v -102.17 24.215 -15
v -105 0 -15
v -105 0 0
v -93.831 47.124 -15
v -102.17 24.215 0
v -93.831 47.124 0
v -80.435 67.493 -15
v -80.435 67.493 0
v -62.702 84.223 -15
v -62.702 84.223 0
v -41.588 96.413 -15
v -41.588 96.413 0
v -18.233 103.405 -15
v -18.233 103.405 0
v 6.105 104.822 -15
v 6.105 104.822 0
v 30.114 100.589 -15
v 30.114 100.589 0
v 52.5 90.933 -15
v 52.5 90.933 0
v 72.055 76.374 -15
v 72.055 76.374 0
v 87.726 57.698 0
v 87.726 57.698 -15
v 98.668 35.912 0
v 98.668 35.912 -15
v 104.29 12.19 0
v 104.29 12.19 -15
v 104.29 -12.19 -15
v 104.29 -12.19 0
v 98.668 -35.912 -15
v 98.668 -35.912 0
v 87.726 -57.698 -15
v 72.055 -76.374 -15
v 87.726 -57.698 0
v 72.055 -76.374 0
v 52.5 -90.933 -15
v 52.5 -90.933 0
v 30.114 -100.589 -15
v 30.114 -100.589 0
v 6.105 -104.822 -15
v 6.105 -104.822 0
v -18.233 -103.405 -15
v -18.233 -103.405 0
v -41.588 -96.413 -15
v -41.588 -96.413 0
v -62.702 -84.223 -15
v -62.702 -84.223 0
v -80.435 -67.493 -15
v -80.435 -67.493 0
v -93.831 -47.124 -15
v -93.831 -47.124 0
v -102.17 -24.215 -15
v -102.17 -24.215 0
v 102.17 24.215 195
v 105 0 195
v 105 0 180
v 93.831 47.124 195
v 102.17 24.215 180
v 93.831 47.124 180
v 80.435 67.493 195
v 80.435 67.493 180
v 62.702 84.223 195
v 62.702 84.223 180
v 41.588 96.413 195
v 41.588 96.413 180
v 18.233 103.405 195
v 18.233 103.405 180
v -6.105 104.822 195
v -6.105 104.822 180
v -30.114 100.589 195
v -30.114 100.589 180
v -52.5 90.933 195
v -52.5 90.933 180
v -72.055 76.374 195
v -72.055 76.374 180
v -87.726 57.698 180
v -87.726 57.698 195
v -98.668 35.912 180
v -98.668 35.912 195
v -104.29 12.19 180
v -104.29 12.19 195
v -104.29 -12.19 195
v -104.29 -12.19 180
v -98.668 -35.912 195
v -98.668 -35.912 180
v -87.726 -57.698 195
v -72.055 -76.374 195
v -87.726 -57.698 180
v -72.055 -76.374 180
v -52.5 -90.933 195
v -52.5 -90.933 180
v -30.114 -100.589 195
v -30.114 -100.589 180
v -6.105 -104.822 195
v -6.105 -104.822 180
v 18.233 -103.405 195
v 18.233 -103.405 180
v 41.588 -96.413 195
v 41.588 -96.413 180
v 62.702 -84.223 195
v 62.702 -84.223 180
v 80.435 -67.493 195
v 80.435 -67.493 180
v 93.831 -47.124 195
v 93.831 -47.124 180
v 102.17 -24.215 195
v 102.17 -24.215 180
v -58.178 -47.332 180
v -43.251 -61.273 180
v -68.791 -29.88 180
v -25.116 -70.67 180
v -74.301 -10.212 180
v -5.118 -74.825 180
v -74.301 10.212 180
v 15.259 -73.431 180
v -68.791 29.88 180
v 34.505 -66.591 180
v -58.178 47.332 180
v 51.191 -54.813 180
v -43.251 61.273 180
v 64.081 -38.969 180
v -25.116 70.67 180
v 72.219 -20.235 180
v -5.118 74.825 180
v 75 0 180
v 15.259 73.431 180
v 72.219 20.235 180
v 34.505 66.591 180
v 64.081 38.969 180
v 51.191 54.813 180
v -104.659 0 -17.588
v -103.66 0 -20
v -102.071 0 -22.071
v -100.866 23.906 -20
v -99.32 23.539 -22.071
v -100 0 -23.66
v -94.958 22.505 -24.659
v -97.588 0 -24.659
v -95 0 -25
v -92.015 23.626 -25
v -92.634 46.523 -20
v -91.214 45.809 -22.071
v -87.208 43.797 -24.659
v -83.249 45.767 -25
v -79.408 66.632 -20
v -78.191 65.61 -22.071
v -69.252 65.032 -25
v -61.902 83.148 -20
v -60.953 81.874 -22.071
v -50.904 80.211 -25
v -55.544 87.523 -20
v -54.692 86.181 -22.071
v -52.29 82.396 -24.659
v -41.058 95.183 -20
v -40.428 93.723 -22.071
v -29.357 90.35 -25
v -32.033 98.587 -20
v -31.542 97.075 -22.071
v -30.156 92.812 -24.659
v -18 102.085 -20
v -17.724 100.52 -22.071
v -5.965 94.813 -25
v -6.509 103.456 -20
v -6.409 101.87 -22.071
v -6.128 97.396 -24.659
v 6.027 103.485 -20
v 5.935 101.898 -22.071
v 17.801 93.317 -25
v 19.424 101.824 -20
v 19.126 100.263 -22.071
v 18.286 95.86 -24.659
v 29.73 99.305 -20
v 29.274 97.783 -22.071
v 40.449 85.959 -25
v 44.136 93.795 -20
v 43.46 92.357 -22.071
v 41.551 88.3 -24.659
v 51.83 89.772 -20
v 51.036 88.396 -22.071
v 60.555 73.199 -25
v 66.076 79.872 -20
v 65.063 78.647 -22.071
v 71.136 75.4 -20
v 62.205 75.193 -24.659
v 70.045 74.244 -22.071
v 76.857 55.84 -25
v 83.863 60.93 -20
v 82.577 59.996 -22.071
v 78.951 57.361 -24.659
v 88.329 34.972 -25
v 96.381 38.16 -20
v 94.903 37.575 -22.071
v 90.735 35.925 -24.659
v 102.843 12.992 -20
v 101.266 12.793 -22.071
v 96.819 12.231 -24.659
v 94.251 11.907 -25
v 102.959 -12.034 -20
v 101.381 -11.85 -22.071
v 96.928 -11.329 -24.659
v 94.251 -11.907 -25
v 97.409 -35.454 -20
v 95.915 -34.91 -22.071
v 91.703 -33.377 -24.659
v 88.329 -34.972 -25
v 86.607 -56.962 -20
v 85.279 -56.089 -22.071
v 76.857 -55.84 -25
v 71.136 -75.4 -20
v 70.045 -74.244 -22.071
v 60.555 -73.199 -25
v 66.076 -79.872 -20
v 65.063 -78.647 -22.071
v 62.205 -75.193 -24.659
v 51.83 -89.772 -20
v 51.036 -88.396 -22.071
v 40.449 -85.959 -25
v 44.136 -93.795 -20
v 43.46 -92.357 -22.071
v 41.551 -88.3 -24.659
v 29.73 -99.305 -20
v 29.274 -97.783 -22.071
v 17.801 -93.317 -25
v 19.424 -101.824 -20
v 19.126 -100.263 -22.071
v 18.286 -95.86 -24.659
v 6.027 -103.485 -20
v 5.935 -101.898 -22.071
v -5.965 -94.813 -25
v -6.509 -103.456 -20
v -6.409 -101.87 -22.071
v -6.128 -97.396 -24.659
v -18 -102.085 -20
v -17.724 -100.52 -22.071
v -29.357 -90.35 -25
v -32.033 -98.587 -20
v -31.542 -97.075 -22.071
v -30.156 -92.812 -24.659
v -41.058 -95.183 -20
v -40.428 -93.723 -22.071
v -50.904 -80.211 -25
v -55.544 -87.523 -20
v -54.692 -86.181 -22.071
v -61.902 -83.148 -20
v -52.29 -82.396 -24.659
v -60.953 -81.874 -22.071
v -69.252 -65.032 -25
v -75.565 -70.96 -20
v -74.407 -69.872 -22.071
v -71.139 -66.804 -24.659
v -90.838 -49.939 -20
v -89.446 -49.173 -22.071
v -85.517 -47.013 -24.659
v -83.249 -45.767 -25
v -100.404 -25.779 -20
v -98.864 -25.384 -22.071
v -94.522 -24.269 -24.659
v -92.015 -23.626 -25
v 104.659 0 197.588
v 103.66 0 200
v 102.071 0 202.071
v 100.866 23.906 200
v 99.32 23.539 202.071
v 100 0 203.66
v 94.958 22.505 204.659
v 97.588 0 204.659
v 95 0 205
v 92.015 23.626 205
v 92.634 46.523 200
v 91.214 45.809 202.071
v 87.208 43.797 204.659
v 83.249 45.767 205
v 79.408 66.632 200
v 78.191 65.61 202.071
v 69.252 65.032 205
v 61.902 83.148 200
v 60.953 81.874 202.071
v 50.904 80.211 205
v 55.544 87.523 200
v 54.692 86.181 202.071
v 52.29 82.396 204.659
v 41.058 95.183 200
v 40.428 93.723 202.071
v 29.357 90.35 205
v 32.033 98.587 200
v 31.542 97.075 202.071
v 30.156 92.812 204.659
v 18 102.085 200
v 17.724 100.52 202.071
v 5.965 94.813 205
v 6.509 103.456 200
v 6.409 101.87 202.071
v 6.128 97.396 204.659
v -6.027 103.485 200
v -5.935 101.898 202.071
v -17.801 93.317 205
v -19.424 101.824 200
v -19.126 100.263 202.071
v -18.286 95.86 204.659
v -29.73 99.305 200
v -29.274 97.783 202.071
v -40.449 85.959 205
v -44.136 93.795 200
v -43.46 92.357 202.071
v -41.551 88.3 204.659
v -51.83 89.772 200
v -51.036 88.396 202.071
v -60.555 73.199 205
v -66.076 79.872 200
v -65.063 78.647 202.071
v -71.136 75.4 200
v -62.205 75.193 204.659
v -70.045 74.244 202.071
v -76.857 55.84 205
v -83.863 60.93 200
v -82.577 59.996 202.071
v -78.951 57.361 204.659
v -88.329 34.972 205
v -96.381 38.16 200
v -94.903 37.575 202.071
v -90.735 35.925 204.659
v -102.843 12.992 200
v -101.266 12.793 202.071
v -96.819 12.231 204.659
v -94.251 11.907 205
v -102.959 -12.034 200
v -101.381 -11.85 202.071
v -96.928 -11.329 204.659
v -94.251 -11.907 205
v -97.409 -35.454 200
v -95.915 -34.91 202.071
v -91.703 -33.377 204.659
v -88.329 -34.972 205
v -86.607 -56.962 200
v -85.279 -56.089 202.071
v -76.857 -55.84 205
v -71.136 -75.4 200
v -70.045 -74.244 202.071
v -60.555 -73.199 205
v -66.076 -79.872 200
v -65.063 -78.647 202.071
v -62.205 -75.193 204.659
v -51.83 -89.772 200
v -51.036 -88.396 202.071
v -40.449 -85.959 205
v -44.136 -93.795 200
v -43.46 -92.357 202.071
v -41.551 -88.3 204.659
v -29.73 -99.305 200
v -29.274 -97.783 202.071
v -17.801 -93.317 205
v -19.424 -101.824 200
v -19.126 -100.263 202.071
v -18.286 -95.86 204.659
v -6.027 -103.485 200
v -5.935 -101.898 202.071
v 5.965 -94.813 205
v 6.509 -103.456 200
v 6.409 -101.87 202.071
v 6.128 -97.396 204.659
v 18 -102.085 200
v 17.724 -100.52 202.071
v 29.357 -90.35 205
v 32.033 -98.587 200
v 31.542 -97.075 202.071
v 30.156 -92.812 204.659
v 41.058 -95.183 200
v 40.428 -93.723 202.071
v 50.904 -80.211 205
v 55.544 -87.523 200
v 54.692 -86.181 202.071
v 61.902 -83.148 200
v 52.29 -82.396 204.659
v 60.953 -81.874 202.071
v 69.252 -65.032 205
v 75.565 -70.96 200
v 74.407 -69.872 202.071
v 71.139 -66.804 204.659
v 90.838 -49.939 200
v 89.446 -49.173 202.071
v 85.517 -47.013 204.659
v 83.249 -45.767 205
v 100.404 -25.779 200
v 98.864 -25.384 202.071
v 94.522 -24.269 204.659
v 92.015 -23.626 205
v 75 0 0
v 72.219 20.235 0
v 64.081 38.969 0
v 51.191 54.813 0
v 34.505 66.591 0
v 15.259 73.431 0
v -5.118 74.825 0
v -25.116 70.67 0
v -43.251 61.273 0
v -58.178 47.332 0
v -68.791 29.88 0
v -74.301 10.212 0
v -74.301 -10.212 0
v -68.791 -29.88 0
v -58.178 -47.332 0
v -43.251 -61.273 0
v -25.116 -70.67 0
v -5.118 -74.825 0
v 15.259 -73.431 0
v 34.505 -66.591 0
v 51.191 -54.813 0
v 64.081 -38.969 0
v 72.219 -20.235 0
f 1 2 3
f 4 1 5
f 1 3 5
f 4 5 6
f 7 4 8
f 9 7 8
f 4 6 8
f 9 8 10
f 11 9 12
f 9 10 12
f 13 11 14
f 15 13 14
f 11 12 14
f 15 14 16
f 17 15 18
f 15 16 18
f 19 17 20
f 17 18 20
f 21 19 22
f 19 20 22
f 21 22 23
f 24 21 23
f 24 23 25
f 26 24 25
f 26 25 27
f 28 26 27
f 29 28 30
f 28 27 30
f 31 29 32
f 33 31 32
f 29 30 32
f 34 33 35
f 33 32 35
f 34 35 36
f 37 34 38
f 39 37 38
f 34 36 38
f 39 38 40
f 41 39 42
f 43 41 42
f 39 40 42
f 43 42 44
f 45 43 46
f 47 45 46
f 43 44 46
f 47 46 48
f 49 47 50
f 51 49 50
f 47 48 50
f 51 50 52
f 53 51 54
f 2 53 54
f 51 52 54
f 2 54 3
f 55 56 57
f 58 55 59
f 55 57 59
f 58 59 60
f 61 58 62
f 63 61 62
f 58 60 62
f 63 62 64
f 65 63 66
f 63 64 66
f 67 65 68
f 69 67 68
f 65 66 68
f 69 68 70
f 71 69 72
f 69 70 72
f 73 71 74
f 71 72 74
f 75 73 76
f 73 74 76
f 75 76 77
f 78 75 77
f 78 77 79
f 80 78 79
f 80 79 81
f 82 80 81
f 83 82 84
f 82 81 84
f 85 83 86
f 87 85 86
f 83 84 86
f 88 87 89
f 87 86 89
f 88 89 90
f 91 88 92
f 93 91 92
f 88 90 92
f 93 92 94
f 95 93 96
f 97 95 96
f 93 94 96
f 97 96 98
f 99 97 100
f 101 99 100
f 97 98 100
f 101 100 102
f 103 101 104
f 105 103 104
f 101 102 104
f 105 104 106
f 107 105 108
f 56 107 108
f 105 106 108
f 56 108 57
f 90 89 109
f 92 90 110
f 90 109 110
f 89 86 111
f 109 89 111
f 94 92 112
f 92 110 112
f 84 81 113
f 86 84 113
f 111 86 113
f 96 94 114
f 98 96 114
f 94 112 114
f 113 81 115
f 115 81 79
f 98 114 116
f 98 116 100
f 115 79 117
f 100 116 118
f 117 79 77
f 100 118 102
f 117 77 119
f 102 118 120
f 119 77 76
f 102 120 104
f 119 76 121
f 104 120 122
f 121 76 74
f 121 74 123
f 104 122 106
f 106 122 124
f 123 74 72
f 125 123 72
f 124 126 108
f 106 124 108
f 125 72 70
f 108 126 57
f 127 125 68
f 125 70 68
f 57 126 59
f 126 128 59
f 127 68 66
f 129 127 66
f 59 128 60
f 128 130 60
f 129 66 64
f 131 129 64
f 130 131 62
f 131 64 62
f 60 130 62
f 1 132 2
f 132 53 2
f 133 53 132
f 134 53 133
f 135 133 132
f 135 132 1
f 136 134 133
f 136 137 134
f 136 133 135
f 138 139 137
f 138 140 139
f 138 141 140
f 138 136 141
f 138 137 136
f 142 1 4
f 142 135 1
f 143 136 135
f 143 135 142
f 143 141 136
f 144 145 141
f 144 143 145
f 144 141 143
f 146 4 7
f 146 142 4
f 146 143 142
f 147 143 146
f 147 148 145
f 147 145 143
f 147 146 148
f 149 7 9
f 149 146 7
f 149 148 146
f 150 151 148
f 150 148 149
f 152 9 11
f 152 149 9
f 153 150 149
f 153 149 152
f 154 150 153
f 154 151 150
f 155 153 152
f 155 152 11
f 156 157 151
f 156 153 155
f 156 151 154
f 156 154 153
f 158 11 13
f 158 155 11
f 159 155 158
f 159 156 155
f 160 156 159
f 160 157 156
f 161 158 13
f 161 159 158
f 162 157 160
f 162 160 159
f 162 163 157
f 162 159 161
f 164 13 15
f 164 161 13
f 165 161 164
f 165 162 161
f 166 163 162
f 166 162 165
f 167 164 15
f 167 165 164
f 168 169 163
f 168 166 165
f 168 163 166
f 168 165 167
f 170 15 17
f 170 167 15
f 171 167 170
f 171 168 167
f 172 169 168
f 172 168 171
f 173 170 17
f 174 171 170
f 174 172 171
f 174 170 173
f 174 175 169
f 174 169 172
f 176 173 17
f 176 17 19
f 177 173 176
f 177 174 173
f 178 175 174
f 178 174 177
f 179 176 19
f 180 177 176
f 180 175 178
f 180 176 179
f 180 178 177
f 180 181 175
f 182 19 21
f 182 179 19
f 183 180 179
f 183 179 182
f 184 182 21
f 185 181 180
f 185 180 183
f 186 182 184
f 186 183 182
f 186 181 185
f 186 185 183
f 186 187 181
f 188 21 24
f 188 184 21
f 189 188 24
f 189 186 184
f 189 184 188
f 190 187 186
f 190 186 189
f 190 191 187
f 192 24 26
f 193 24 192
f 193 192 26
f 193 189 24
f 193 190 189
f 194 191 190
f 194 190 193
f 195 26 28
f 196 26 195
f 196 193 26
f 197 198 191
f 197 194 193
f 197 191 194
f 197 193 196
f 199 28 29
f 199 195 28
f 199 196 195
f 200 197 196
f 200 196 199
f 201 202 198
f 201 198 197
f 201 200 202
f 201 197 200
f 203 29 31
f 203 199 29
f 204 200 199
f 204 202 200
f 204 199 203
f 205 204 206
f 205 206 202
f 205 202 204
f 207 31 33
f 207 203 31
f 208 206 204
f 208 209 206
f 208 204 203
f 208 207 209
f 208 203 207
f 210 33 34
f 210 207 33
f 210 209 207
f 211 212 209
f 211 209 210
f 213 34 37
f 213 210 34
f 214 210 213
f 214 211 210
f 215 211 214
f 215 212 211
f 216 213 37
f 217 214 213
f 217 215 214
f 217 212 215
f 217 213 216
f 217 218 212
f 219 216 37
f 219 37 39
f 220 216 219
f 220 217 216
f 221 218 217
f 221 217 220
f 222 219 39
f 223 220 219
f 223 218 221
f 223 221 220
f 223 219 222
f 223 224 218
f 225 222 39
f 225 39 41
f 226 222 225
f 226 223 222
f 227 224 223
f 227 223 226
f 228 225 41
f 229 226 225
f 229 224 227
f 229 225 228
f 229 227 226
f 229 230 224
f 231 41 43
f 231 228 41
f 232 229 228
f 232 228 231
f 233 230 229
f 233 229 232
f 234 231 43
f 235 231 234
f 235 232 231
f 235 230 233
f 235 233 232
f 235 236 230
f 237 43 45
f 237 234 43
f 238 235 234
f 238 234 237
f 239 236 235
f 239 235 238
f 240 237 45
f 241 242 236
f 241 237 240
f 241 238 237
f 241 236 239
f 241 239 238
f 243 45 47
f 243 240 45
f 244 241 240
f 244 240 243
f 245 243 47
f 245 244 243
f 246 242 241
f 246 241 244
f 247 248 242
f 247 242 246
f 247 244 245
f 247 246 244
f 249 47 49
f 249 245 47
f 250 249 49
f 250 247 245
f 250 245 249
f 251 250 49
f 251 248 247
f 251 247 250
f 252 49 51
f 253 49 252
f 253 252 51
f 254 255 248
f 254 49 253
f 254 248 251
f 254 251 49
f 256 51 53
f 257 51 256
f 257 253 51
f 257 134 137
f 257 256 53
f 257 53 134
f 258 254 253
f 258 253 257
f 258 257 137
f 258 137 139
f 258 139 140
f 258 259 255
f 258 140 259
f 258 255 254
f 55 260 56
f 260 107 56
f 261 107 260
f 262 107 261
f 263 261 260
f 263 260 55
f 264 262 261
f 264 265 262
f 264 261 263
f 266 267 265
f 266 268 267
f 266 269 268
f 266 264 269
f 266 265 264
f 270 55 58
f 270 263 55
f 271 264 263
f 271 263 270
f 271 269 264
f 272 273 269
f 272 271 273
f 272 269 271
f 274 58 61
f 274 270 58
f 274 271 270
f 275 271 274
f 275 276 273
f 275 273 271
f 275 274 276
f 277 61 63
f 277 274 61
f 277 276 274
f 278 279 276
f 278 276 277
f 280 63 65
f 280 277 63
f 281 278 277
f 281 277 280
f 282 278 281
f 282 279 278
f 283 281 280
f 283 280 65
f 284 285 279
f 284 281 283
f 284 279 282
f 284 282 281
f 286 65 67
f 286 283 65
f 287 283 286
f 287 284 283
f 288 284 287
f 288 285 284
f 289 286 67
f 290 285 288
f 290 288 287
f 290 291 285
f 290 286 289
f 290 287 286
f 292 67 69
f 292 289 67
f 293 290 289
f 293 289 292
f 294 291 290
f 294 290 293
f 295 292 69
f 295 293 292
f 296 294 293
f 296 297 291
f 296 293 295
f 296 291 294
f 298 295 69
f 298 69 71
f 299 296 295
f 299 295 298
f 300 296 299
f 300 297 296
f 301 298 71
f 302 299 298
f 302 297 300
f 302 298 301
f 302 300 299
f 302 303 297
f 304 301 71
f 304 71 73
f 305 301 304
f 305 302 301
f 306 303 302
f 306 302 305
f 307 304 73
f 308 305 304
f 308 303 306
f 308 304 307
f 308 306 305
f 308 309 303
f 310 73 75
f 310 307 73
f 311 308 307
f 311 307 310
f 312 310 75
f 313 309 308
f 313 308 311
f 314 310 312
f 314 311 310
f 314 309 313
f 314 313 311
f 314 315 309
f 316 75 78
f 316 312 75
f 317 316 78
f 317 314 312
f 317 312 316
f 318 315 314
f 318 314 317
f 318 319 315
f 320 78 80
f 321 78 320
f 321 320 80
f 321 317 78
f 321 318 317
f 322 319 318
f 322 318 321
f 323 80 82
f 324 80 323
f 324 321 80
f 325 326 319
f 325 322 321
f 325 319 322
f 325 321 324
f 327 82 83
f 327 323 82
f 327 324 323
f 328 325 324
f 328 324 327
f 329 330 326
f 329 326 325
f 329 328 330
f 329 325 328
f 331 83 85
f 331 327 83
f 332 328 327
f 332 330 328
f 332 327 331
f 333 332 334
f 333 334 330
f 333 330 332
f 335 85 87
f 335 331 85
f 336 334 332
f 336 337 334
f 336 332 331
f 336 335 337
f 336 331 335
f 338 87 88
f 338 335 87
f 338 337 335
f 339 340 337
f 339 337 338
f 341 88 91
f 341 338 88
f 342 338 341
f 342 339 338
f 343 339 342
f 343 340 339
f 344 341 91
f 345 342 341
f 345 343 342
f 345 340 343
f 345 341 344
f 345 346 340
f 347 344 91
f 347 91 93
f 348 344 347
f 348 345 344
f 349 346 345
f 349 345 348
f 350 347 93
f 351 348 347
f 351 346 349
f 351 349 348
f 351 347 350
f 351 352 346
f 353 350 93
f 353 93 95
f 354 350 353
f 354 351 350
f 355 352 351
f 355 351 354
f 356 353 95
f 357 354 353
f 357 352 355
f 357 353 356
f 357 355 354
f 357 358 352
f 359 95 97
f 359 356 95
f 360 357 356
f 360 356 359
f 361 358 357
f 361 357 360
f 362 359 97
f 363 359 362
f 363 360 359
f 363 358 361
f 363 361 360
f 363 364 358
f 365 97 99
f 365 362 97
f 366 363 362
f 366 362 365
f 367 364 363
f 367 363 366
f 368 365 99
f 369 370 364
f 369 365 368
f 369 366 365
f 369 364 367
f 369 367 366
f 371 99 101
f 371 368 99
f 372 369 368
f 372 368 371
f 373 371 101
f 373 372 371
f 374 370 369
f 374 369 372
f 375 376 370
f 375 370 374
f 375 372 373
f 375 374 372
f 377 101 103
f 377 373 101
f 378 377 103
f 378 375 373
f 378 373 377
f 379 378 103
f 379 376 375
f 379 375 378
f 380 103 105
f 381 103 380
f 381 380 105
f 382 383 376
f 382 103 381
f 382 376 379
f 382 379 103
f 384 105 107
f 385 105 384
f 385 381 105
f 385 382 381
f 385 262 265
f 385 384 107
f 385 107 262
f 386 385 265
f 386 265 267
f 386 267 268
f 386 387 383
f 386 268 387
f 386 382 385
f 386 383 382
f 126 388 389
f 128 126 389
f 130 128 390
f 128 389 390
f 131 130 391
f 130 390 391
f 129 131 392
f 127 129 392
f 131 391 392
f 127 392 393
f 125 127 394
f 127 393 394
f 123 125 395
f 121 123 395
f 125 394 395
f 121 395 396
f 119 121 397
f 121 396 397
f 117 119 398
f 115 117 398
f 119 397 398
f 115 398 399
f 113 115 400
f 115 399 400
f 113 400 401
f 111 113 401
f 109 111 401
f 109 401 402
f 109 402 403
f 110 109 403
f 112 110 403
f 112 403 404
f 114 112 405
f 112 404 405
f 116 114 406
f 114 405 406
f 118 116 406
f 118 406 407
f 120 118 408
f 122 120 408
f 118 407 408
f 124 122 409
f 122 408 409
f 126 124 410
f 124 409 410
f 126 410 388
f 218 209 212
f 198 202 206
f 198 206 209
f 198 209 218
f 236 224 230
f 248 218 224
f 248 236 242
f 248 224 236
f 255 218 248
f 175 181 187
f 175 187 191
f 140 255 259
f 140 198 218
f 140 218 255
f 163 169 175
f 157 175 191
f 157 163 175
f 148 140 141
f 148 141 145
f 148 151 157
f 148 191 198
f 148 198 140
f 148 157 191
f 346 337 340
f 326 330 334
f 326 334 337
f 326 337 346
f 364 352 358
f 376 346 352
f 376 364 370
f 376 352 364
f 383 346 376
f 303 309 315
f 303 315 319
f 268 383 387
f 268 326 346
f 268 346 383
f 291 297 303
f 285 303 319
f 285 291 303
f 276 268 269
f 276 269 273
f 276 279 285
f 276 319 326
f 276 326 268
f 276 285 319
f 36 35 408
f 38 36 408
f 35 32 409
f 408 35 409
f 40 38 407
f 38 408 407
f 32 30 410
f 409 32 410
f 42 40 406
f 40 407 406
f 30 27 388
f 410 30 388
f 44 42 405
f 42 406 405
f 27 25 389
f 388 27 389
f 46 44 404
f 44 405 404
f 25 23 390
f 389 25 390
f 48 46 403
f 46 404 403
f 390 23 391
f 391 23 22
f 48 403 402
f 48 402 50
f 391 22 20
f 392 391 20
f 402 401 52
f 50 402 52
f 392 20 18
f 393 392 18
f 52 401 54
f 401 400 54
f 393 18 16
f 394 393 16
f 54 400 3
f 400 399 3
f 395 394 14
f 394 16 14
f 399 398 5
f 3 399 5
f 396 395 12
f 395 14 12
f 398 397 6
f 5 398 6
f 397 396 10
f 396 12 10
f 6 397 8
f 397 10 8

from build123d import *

# Parameters (mm, degrees)
SKETCH1_R           = 75
BOSS_EXTRUDE1_DEPTH = 180
SKETCH2_R           = 105
BOSS_EXTRUDE2_DEPTH = 25
SKETCH3_R           = 105
BOSS_EXTRUDE3_DEPTH = 25
FILLET1_R           = 10


with BuildPart() as part:
    # Sketch1 → Boss-Extrude1 (new body)
    with BuildSketch(Plane.XY):
        Circle(SKETCH1_R)
    extrude(amount=BOSS_EXTRUDE1_DEPTH)

    # Sketch2 → Boss-Extrude2 (add)
    with BuildSketch(Plane.XY.offset(180)):
        Circle(SKETCH2_R)
    extrude(amount=BOSS_EXTRUDE2_DEPTH)

    # Sketch3 → Boss-Extrude3 (add)
    with BuildSketch(Plane(origin=(0, 0, 0), x_dir=(-1, 0, 0), z_dir=(0, 0, -1))):
        Circle(SKETCH3_R)
    extrude(amount=BOSS_EXTRUDE3_DEPTH)

    # Fillet1
    fillet1_edges = [part.edges().sort_by_distance(p)[0] for p in [
        (105, 0, -25),
        (-105, 0, 205),
    ]]
    fillet(fillet1_edges, radius=FILLET1_R)


solid = part.part
